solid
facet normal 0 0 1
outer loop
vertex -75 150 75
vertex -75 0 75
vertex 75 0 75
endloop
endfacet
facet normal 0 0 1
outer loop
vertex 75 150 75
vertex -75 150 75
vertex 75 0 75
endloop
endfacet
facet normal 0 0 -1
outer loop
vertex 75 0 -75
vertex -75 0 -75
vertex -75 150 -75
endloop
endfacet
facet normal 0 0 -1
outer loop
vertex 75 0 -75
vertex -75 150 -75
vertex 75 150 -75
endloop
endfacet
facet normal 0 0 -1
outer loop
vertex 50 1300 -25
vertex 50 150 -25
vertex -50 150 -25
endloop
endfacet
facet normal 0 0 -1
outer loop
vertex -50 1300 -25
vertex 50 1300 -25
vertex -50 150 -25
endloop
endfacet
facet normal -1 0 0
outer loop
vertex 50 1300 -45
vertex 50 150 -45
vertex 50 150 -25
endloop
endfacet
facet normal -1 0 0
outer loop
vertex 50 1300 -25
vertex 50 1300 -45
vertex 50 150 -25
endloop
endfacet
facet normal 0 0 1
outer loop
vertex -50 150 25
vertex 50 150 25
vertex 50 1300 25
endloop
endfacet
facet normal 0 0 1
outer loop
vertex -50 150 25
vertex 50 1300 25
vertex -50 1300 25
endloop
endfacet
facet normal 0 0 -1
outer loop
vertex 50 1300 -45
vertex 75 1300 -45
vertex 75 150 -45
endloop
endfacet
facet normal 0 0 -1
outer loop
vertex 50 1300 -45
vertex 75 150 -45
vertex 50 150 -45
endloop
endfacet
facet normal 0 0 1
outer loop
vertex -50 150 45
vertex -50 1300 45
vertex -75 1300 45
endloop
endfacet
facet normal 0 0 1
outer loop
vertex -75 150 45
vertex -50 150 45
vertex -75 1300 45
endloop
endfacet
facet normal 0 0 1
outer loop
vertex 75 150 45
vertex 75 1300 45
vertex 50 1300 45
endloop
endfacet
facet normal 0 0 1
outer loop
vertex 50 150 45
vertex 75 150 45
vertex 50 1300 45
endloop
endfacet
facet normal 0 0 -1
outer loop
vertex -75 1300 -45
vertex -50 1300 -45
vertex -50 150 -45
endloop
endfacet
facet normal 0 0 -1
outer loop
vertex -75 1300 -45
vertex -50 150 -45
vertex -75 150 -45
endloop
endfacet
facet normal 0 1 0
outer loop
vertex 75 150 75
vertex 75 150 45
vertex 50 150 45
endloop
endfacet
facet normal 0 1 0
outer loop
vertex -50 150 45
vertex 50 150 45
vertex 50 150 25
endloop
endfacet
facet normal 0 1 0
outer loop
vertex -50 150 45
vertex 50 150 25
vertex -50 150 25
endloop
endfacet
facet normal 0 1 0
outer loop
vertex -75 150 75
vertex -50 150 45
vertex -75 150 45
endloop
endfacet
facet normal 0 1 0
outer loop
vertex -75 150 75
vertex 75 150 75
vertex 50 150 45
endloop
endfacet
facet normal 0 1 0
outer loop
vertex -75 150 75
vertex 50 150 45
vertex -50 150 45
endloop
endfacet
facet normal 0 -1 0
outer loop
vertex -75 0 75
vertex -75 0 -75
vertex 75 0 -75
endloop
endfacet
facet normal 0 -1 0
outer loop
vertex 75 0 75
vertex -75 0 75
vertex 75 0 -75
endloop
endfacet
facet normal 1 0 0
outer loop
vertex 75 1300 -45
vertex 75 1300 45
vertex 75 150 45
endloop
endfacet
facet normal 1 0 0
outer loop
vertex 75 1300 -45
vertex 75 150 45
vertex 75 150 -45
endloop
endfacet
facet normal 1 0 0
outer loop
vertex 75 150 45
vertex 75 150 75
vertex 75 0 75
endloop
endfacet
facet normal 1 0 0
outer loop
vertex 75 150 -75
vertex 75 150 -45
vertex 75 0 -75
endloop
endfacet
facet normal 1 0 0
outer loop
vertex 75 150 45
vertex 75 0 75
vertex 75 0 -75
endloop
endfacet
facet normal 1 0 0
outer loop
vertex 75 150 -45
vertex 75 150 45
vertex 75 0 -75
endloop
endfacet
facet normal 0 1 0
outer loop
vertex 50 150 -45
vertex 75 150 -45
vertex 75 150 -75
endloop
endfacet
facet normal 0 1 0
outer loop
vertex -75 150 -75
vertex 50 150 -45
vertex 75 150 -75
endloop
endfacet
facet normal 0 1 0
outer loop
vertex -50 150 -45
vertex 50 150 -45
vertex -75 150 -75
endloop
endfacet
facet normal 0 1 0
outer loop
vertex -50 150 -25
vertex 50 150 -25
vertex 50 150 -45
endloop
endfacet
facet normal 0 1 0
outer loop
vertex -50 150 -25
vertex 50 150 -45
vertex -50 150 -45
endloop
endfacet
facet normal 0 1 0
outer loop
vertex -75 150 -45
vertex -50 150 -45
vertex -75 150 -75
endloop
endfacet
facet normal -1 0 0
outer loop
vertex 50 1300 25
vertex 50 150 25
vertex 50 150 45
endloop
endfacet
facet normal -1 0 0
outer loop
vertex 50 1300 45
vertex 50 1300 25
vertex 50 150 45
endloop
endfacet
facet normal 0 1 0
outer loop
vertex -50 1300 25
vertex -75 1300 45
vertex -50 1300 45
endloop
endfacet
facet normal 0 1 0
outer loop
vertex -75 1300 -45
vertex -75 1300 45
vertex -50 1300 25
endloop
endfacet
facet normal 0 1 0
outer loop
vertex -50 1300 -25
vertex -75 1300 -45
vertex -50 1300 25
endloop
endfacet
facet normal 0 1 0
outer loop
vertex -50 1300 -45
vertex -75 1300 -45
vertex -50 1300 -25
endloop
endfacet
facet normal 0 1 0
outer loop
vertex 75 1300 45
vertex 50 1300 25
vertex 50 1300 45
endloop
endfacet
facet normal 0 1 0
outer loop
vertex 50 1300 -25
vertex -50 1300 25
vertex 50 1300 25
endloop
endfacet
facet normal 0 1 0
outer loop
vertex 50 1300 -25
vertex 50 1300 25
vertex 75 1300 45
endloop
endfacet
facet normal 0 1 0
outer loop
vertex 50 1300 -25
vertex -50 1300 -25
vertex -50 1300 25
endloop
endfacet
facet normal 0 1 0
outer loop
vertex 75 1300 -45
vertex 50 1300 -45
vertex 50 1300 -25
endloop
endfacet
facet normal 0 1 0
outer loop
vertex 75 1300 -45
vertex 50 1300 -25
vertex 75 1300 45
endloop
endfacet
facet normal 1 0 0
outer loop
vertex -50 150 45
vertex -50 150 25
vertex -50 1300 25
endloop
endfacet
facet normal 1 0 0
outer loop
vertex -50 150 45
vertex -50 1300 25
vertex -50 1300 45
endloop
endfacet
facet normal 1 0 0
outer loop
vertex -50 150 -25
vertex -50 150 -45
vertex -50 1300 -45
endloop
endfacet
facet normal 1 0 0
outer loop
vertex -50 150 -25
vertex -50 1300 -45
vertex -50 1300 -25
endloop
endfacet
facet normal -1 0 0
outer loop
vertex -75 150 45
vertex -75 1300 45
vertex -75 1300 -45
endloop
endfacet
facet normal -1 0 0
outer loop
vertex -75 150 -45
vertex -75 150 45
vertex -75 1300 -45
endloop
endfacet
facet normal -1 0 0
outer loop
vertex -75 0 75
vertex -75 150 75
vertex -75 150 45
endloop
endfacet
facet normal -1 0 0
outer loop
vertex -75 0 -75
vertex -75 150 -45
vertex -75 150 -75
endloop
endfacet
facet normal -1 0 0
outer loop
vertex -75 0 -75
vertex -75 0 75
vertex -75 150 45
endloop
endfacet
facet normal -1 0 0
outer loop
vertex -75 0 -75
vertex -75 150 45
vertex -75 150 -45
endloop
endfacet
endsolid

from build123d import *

# Parameters (mm, degrees)
SKETCH2_W           = 150
SKETCH2_H           = 150
BOSS_EXTRUDE1_DEPTH = 1300
SKETCH3_W           = 100
SKETCH3_H           = 50
CUT_EXTRUDE3_DEPTH  = 1150
SKETCH4_W           = 150
SKETCH4_H           = 30
CUT_EXTRUDE4_DEPTH  = 1150


with BuildPart() as part:
    # Sketch2 → Boss-Extrude1 (new body)
    with BuildSketch(Plane(origin=(0, 0, 0), x_dir=(1, 0, 0), z_dir=(0, 1, 0))):
        Rectangle(SKETCH2_W, SKETCH2_H)
    extrude(amount=BOSS_EXTRUDE1_DEPTH)

    # Sketch3 → Cut-Extrude3 (cut)
    with BuildSketch(Plane(origin=(0, 1300, 0), x_dir=(-1, 0, 0), z_dir=(0, 1, 0))):
        with Locations((0, -50)):
            Rectangle(SKETCH3_W, SKETCH3_H)
        with Locations((0, 50)):
            Rectangle(SKETCH3_W, SKETCH3_H)
    extrude(amount=-CUT_EXTRUDE3_DEPTH, mode=Mode.SUBTRACT)

    # Sketch4 → Cut-Extrude4 (cut)
    with BuildSketch(Plane(origin=(0, 1300, 0), x_dir=(-1, 0, 0), z_dir=(0, 1, 0))):
        with Locations((0, -60)):
            Rectangle(SKETCH4_W, SKETCH4_H)
        with Locations((0, 60)):
            Rectangle(SKETCH4_W, SKETCH4_H)
    extrude(amount=-CUT_EXTRUDE4_DEPTH, mode=Mode.SUBTRACT)


solid = part.part
